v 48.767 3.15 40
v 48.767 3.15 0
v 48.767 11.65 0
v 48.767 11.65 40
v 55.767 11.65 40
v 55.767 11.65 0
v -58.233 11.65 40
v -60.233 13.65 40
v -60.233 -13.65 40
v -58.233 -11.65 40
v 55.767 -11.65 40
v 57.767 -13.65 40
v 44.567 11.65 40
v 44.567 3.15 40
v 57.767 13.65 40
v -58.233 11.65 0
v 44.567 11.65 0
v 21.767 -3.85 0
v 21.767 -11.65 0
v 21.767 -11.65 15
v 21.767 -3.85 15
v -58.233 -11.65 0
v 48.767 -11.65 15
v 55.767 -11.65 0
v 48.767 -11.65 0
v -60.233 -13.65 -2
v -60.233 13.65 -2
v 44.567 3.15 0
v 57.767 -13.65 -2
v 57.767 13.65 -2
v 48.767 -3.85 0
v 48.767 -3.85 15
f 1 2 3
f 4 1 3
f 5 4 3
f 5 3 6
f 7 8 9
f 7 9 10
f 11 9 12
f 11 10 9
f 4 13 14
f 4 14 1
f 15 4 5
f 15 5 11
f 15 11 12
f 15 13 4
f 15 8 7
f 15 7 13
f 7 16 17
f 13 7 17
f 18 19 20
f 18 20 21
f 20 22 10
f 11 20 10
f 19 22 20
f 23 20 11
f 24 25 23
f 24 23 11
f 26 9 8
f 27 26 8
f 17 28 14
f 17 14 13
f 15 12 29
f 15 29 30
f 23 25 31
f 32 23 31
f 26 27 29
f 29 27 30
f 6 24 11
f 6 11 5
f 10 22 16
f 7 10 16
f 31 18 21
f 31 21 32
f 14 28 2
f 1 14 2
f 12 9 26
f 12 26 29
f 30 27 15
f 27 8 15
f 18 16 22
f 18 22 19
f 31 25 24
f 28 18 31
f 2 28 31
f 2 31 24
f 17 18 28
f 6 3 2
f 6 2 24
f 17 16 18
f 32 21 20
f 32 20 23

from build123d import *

# Parameters (mm, degrees)
F0_W     = 118
F0_H     = 27.3
F0_W_2   = 114
F0_H_2   = 23.3
F1_DEPTH = 40
F2_W     = 4.2
F2_H     = 8.5
F3_DEPTH = 40
F4_W     = 27
F4_H     = 7.8
F5_DEPTH = 15
F6_W     = 118
F6_H     = 27.3
F7_DEPTH = 2


with BuildPart() as f1:
    # F0 (on Top) → F1 (new body)
    with BuildSketch(Plane.XY):
        with Locations((-1.233262, 0)):
            Rectangle(F0_W, F0_H)
        with Locations((-1.233262, 0)):
            Rectangle(F0_W_2, F0_H_2, mode=Mode.SUBTRACT)
    extrude(amount=F1_DEPTH)

    # F2 (on Top) → F3 (join)
    with BuildSketch(Plane.XY):
        with Locations((46.666738, 7.4)):
            Rectangle(F2_W, F2_H)
    extrude(amount=F3_DEPTH)

    # F4 (on Top) → F5 (join)
    with BuildSketch(Plane.XY):
        with Locations((35.266738, -7.75)):
            Rectangle(F4_W, F4_H)
    extrude(amount=F5_DEPTH)

    # F6 (on Top) → F7 (join)
    with BuildSketch(Plane.XY):
        with Locations((-1.233262, 0)):
            Rectangle(F6_W, F6_H)
    extrude(amount=-F7_DEPTH)


solid = f1.part
